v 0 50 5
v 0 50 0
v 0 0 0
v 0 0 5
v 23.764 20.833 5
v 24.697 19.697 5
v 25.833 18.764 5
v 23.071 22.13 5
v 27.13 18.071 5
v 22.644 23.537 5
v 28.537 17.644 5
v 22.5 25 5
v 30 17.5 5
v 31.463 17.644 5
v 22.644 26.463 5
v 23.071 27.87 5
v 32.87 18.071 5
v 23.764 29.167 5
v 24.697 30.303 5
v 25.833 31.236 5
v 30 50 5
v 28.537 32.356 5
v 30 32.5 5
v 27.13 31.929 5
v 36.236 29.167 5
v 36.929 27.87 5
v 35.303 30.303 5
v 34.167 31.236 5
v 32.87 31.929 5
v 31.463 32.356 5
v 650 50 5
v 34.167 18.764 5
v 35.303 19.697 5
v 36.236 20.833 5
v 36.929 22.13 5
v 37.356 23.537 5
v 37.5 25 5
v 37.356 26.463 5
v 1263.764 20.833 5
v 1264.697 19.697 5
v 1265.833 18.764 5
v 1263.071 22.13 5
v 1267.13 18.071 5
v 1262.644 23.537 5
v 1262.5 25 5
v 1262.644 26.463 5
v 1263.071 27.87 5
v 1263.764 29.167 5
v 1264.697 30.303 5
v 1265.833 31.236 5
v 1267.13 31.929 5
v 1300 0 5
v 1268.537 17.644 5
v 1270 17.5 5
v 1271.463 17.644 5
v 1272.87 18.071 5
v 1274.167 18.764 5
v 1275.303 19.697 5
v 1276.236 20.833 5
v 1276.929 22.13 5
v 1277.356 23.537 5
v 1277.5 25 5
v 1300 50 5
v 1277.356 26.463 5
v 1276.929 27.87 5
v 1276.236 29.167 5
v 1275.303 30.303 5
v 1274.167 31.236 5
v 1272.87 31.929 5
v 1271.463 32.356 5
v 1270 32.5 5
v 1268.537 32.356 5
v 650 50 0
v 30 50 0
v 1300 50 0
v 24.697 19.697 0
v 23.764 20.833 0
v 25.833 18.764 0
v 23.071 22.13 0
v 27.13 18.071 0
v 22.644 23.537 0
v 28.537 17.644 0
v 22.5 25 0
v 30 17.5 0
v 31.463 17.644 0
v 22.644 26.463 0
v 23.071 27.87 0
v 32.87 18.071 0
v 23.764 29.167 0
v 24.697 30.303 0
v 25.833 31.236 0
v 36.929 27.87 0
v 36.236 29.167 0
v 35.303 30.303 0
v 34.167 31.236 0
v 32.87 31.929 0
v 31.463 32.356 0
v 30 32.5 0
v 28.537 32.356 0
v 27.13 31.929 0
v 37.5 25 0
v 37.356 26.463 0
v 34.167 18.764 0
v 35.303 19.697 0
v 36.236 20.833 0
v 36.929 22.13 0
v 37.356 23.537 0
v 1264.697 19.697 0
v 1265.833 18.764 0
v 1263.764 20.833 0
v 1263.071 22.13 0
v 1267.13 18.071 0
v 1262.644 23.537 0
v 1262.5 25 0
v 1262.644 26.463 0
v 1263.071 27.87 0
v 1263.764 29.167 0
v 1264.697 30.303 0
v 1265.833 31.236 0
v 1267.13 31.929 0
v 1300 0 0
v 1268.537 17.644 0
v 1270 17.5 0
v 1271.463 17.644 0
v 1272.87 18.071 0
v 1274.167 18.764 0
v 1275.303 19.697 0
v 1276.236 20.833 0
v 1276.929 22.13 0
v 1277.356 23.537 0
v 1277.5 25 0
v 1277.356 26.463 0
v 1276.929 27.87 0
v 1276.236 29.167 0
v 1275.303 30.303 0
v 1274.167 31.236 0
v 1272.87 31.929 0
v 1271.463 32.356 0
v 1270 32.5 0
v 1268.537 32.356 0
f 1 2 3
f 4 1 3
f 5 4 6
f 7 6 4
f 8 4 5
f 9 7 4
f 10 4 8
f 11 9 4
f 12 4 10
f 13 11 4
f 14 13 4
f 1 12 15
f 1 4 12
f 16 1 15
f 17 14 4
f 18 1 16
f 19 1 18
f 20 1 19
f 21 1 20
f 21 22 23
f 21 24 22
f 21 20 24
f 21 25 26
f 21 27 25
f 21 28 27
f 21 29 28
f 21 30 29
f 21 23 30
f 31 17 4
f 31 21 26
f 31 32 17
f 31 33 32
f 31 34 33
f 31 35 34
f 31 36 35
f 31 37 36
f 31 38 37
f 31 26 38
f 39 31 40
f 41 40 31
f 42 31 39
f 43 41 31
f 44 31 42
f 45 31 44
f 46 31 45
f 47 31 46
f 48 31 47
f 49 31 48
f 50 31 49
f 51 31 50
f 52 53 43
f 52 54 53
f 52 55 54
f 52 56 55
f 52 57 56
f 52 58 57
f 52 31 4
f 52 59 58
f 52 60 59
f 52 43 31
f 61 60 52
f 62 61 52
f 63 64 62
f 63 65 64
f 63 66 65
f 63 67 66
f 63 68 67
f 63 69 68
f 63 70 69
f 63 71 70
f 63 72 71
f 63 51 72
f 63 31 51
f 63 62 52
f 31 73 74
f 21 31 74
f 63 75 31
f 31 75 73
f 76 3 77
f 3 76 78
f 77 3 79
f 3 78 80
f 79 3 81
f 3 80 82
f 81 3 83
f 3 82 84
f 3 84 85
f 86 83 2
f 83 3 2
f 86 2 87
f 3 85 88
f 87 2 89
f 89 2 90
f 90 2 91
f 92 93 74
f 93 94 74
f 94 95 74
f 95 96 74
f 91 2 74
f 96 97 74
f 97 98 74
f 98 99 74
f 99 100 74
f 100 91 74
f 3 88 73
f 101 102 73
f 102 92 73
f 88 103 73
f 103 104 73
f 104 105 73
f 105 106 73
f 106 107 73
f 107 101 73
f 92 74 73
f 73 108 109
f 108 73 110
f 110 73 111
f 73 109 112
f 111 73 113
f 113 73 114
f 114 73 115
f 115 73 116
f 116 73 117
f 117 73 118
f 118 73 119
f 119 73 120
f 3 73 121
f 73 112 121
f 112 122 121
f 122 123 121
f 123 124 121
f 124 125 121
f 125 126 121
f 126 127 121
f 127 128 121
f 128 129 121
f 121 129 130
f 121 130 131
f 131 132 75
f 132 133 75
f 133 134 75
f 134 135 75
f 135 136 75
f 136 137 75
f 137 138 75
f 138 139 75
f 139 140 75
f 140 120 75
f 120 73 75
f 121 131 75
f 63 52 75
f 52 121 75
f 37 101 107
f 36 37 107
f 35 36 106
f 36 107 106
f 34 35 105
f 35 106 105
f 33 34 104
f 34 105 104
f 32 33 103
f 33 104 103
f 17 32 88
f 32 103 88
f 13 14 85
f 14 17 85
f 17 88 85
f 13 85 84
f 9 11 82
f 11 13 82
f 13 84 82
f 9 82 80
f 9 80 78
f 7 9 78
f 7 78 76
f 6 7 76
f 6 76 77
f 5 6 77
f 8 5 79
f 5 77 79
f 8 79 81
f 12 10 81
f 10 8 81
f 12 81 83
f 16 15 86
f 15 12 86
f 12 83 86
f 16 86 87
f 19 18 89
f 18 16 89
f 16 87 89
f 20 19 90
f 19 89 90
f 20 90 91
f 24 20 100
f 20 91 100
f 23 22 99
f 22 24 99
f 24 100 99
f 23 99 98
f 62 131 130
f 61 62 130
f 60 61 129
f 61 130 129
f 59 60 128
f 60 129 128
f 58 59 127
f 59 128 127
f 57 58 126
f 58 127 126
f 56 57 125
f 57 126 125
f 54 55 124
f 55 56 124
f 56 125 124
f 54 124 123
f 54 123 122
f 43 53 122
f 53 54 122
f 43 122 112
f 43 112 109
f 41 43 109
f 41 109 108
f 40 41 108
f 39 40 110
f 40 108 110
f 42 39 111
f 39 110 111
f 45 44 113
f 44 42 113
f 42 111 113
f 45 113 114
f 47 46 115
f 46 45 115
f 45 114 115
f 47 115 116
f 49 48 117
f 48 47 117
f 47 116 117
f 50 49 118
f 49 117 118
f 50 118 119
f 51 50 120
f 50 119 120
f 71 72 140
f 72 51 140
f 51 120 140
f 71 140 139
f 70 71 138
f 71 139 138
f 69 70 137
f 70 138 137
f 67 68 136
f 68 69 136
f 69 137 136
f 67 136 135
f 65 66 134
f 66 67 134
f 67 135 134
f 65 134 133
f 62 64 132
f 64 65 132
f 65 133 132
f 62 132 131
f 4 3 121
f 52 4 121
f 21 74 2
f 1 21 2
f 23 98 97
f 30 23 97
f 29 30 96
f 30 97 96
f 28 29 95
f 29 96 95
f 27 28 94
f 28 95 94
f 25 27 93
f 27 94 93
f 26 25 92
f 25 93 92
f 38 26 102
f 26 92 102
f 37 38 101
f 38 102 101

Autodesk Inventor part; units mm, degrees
ref_plane "YZ Plane" through (0, 0, 0) normal (1, 0, 0) x (0, 1, 0)
ref_plane "XZ Plane" through (0, 0, 0) normal (0, 1, 0) x (-1, 0, 0)
ref_plane "XY Plane" through (0, 0, 0) normal (0, 0, 1) x (1, 0, 0)
sketch "Sketch1" plane through (0, 0, 0) normal (0, 0, 1) x (1, 0, 0)
  line L0 (0, 0) -> (1300, 0)
  line L1 (1300, 0) -> (1300, 50)
  line L2 (1300, 50) -> (0, 50)
  line L3 (0, 50) -> (0, 0)
  line L4 (0, 50) -> (30, 50)
  line L5 (30, 50) -> (30, 25)
  circle A0 centre (30, 25) radius 7.5
  line L6 (650, 50) -> (650, 17.5)
  circle A1 centre (1270, 25) radius 7.5
  dimension "d0" = 1300
  dimension "d1" = 50
  dimension "d4" = 30
  dimension "d5" = 15
extrude "Extrusion2" add sketch "Sketch1" along normal blind 5
